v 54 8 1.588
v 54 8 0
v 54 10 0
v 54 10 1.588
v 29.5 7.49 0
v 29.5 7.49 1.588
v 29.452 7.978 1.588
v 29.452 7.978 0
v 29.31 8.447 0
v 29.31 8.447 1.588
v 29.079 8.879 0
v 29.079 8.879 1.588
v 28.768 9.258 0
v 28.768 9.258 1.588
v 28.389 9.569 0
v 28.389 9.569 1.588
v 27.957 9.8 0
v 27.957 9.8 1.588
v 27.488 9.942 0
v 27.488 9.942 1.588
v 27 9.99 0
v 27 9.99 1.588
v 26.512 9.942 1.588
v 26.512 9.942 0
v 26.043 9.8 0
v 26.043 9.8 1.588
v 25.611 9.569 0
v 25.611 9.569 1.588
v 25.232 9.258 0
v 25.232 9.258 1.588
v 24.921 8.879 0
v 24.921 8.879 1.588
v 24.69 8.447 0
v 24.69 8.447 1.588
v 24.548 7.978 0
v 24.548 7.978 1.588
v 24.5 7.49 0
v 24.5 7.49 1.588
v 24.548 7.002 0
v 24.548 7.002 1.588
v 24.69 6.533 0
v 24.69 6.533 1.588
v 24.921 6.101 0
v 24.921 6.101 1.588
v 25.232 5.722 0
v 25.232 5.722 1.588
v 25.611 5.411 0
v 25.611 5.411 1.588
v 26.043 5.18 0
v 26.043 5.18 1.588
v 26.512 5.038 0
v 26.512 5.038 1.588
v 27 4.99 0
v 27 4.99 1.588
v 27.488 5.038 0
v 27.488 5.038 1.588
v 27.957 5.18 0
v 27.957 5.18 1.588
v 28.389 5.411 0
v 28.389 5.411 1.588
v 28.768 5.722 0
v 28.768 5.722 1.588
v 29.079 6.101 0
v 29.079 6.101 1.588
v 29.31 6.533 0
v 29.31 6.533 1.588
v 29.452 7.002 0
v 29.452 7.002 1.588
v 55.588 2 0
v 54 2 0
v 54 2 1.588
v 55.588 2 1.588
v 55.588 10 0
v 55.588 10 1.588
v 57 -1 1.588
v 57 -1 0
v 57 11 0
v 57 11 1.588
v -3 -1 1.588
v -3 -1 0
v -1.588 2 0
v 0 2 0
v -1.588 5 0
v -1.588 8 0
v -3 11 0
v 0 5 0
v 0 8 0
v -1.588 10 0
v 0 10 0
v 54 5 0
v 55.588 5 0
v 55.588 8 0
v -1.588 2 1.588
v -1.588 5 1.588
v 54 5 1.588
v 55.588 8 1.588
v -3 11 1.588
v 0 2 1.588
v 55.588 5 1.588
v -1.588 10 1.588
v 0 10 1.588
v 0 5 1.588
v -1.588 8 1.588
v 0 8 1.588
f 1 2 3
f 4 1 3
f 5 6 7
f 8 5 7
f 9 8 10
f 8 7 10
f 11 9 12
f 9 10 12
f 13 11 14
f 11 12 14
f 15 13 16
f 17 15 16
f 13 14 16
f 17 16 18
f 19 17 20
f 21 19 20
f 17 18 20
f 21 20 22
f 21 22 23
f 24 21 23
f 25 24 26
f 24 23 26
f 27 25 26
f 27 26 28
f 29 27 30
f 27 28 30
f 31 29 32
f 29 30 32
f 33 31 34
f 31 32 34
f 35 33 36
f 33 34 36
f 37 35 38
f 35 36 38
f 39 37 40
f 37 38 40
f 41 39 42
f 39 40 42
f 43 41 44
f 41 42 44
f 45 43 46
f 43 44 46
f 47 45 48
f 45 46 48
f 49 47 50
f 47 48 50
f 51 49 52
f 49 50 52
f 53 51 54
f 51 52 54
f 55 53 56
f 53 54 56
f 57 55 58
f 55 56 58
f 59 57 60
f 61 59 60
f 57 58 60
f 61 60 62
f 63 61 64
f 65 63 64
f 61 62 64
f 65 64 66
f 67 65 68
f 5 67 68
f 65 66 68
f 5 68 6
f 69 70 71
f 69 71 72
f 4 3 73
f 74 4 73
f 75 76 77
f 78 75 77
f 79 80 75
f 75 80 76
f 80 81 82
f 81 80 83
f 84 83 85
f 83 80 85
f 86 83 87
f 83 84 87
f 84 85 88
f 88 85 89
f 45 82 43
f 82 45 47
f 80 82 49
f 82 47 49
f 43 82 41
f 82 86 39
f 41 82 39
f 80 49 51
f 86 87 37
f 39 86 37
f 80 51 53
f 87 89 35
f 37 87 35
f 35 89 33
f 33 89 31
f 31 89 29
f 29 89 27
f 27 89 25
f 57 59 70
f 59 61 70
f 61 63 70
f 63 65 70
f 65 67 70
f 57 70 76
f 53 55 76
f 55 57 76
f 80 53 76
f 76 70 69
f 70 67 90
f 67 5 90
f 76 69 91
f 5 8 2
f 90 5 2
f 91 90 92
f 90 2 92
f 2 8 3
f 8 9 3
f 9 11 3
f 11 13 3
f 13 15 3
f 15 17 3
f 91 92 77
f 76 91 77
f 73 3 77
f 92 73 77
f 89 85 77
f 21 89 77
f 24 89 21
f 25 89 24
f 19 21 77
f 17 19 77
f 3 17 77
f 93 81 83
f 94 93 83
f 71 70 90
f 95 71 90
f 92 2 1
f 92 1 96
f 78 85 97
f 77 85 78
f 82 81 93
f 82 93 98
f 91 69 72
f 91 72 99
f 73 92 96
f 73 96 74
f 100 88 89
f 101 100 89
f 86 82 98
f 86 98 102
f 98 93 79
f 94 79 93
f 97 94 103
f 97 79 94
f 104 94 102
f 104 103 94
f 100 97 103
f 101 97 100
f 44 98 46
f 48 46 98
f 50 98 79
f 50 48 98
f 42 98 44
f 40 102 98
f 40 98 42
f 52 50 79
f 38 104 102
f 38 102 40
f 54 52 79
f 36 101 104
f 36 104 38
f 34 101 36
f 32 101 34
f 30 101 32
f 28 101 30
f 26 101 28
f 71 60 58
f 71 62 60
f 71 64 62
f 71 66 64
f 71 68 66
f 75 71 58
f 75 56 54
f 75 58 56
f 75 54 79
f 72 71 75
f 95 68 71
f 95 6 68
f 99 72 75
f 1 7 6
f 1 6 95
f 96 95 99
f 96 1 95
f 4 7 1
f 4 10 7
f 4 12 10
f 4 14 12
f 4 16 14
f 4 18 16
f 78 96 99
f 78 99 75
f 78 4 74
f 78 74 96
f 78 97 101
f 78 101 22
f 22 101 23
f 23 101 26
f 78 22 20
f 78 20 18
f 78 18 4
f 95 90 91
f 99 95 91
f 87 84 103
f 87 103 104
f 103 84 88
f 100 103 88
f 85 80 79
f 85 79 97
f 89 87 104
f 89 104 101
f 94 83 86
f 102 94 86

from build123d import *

# Parameters (mm, degrees)
SKETCH1_W        = 60
SKETCH1_H        = 12
SKETCH1_W_2      = 1.5875
SKETCH1_H_2      = 3
SKETCH1_H_3      = 2
EXTRUSION1_DEPTH = 1.5875
SKETCH2_R        = 2.5
EXTRUSION2_DEPTH = 1.5875


with BuildPart() as part:
    # Sketch1 → Extrusion1 (new body)
    with BuildSketch(Plane.XY):
        with Locations((27, 5)):
            Rectangle(SKETCH1_W, SKETCH1_H)
        with Locations((-0.79375, 3.5)):
            Rectangle(SKETCH1_W_2, SKETCH1_H_2, mode=Mode.SUBTRACT)
        with Locations((-0.79375, 9)):
            Rectangle(SKETCH1_W_2, SKETCH1_H_3, mode=Mode.SUBTRACT)
        with Locations((54.79375, 9)):
            Rectangle(SKETCH1_W_2, SKETCH1_H_3, mode=Mode.SUBTRACT)
        with Locations((54.79375, 3.5)):
            Rectangle(SKETCH1_W_2, SKETCH1_H_2, mode=Mode.SUBTRACT)
    extrude(amount=EXTRUSION1_DEPTH)

    # Sketch2 → Extrusion2 (cut)
    with BuildSketch(Plane.XY.offset(1.5875)):
        with Locations((27, 7.489892181)):
            Circle(SKETCH2_R)
    extrude(amount=-EXTRUSION2_DEPTH, mode=Mode.SUBTRACT)


solid = part.part
